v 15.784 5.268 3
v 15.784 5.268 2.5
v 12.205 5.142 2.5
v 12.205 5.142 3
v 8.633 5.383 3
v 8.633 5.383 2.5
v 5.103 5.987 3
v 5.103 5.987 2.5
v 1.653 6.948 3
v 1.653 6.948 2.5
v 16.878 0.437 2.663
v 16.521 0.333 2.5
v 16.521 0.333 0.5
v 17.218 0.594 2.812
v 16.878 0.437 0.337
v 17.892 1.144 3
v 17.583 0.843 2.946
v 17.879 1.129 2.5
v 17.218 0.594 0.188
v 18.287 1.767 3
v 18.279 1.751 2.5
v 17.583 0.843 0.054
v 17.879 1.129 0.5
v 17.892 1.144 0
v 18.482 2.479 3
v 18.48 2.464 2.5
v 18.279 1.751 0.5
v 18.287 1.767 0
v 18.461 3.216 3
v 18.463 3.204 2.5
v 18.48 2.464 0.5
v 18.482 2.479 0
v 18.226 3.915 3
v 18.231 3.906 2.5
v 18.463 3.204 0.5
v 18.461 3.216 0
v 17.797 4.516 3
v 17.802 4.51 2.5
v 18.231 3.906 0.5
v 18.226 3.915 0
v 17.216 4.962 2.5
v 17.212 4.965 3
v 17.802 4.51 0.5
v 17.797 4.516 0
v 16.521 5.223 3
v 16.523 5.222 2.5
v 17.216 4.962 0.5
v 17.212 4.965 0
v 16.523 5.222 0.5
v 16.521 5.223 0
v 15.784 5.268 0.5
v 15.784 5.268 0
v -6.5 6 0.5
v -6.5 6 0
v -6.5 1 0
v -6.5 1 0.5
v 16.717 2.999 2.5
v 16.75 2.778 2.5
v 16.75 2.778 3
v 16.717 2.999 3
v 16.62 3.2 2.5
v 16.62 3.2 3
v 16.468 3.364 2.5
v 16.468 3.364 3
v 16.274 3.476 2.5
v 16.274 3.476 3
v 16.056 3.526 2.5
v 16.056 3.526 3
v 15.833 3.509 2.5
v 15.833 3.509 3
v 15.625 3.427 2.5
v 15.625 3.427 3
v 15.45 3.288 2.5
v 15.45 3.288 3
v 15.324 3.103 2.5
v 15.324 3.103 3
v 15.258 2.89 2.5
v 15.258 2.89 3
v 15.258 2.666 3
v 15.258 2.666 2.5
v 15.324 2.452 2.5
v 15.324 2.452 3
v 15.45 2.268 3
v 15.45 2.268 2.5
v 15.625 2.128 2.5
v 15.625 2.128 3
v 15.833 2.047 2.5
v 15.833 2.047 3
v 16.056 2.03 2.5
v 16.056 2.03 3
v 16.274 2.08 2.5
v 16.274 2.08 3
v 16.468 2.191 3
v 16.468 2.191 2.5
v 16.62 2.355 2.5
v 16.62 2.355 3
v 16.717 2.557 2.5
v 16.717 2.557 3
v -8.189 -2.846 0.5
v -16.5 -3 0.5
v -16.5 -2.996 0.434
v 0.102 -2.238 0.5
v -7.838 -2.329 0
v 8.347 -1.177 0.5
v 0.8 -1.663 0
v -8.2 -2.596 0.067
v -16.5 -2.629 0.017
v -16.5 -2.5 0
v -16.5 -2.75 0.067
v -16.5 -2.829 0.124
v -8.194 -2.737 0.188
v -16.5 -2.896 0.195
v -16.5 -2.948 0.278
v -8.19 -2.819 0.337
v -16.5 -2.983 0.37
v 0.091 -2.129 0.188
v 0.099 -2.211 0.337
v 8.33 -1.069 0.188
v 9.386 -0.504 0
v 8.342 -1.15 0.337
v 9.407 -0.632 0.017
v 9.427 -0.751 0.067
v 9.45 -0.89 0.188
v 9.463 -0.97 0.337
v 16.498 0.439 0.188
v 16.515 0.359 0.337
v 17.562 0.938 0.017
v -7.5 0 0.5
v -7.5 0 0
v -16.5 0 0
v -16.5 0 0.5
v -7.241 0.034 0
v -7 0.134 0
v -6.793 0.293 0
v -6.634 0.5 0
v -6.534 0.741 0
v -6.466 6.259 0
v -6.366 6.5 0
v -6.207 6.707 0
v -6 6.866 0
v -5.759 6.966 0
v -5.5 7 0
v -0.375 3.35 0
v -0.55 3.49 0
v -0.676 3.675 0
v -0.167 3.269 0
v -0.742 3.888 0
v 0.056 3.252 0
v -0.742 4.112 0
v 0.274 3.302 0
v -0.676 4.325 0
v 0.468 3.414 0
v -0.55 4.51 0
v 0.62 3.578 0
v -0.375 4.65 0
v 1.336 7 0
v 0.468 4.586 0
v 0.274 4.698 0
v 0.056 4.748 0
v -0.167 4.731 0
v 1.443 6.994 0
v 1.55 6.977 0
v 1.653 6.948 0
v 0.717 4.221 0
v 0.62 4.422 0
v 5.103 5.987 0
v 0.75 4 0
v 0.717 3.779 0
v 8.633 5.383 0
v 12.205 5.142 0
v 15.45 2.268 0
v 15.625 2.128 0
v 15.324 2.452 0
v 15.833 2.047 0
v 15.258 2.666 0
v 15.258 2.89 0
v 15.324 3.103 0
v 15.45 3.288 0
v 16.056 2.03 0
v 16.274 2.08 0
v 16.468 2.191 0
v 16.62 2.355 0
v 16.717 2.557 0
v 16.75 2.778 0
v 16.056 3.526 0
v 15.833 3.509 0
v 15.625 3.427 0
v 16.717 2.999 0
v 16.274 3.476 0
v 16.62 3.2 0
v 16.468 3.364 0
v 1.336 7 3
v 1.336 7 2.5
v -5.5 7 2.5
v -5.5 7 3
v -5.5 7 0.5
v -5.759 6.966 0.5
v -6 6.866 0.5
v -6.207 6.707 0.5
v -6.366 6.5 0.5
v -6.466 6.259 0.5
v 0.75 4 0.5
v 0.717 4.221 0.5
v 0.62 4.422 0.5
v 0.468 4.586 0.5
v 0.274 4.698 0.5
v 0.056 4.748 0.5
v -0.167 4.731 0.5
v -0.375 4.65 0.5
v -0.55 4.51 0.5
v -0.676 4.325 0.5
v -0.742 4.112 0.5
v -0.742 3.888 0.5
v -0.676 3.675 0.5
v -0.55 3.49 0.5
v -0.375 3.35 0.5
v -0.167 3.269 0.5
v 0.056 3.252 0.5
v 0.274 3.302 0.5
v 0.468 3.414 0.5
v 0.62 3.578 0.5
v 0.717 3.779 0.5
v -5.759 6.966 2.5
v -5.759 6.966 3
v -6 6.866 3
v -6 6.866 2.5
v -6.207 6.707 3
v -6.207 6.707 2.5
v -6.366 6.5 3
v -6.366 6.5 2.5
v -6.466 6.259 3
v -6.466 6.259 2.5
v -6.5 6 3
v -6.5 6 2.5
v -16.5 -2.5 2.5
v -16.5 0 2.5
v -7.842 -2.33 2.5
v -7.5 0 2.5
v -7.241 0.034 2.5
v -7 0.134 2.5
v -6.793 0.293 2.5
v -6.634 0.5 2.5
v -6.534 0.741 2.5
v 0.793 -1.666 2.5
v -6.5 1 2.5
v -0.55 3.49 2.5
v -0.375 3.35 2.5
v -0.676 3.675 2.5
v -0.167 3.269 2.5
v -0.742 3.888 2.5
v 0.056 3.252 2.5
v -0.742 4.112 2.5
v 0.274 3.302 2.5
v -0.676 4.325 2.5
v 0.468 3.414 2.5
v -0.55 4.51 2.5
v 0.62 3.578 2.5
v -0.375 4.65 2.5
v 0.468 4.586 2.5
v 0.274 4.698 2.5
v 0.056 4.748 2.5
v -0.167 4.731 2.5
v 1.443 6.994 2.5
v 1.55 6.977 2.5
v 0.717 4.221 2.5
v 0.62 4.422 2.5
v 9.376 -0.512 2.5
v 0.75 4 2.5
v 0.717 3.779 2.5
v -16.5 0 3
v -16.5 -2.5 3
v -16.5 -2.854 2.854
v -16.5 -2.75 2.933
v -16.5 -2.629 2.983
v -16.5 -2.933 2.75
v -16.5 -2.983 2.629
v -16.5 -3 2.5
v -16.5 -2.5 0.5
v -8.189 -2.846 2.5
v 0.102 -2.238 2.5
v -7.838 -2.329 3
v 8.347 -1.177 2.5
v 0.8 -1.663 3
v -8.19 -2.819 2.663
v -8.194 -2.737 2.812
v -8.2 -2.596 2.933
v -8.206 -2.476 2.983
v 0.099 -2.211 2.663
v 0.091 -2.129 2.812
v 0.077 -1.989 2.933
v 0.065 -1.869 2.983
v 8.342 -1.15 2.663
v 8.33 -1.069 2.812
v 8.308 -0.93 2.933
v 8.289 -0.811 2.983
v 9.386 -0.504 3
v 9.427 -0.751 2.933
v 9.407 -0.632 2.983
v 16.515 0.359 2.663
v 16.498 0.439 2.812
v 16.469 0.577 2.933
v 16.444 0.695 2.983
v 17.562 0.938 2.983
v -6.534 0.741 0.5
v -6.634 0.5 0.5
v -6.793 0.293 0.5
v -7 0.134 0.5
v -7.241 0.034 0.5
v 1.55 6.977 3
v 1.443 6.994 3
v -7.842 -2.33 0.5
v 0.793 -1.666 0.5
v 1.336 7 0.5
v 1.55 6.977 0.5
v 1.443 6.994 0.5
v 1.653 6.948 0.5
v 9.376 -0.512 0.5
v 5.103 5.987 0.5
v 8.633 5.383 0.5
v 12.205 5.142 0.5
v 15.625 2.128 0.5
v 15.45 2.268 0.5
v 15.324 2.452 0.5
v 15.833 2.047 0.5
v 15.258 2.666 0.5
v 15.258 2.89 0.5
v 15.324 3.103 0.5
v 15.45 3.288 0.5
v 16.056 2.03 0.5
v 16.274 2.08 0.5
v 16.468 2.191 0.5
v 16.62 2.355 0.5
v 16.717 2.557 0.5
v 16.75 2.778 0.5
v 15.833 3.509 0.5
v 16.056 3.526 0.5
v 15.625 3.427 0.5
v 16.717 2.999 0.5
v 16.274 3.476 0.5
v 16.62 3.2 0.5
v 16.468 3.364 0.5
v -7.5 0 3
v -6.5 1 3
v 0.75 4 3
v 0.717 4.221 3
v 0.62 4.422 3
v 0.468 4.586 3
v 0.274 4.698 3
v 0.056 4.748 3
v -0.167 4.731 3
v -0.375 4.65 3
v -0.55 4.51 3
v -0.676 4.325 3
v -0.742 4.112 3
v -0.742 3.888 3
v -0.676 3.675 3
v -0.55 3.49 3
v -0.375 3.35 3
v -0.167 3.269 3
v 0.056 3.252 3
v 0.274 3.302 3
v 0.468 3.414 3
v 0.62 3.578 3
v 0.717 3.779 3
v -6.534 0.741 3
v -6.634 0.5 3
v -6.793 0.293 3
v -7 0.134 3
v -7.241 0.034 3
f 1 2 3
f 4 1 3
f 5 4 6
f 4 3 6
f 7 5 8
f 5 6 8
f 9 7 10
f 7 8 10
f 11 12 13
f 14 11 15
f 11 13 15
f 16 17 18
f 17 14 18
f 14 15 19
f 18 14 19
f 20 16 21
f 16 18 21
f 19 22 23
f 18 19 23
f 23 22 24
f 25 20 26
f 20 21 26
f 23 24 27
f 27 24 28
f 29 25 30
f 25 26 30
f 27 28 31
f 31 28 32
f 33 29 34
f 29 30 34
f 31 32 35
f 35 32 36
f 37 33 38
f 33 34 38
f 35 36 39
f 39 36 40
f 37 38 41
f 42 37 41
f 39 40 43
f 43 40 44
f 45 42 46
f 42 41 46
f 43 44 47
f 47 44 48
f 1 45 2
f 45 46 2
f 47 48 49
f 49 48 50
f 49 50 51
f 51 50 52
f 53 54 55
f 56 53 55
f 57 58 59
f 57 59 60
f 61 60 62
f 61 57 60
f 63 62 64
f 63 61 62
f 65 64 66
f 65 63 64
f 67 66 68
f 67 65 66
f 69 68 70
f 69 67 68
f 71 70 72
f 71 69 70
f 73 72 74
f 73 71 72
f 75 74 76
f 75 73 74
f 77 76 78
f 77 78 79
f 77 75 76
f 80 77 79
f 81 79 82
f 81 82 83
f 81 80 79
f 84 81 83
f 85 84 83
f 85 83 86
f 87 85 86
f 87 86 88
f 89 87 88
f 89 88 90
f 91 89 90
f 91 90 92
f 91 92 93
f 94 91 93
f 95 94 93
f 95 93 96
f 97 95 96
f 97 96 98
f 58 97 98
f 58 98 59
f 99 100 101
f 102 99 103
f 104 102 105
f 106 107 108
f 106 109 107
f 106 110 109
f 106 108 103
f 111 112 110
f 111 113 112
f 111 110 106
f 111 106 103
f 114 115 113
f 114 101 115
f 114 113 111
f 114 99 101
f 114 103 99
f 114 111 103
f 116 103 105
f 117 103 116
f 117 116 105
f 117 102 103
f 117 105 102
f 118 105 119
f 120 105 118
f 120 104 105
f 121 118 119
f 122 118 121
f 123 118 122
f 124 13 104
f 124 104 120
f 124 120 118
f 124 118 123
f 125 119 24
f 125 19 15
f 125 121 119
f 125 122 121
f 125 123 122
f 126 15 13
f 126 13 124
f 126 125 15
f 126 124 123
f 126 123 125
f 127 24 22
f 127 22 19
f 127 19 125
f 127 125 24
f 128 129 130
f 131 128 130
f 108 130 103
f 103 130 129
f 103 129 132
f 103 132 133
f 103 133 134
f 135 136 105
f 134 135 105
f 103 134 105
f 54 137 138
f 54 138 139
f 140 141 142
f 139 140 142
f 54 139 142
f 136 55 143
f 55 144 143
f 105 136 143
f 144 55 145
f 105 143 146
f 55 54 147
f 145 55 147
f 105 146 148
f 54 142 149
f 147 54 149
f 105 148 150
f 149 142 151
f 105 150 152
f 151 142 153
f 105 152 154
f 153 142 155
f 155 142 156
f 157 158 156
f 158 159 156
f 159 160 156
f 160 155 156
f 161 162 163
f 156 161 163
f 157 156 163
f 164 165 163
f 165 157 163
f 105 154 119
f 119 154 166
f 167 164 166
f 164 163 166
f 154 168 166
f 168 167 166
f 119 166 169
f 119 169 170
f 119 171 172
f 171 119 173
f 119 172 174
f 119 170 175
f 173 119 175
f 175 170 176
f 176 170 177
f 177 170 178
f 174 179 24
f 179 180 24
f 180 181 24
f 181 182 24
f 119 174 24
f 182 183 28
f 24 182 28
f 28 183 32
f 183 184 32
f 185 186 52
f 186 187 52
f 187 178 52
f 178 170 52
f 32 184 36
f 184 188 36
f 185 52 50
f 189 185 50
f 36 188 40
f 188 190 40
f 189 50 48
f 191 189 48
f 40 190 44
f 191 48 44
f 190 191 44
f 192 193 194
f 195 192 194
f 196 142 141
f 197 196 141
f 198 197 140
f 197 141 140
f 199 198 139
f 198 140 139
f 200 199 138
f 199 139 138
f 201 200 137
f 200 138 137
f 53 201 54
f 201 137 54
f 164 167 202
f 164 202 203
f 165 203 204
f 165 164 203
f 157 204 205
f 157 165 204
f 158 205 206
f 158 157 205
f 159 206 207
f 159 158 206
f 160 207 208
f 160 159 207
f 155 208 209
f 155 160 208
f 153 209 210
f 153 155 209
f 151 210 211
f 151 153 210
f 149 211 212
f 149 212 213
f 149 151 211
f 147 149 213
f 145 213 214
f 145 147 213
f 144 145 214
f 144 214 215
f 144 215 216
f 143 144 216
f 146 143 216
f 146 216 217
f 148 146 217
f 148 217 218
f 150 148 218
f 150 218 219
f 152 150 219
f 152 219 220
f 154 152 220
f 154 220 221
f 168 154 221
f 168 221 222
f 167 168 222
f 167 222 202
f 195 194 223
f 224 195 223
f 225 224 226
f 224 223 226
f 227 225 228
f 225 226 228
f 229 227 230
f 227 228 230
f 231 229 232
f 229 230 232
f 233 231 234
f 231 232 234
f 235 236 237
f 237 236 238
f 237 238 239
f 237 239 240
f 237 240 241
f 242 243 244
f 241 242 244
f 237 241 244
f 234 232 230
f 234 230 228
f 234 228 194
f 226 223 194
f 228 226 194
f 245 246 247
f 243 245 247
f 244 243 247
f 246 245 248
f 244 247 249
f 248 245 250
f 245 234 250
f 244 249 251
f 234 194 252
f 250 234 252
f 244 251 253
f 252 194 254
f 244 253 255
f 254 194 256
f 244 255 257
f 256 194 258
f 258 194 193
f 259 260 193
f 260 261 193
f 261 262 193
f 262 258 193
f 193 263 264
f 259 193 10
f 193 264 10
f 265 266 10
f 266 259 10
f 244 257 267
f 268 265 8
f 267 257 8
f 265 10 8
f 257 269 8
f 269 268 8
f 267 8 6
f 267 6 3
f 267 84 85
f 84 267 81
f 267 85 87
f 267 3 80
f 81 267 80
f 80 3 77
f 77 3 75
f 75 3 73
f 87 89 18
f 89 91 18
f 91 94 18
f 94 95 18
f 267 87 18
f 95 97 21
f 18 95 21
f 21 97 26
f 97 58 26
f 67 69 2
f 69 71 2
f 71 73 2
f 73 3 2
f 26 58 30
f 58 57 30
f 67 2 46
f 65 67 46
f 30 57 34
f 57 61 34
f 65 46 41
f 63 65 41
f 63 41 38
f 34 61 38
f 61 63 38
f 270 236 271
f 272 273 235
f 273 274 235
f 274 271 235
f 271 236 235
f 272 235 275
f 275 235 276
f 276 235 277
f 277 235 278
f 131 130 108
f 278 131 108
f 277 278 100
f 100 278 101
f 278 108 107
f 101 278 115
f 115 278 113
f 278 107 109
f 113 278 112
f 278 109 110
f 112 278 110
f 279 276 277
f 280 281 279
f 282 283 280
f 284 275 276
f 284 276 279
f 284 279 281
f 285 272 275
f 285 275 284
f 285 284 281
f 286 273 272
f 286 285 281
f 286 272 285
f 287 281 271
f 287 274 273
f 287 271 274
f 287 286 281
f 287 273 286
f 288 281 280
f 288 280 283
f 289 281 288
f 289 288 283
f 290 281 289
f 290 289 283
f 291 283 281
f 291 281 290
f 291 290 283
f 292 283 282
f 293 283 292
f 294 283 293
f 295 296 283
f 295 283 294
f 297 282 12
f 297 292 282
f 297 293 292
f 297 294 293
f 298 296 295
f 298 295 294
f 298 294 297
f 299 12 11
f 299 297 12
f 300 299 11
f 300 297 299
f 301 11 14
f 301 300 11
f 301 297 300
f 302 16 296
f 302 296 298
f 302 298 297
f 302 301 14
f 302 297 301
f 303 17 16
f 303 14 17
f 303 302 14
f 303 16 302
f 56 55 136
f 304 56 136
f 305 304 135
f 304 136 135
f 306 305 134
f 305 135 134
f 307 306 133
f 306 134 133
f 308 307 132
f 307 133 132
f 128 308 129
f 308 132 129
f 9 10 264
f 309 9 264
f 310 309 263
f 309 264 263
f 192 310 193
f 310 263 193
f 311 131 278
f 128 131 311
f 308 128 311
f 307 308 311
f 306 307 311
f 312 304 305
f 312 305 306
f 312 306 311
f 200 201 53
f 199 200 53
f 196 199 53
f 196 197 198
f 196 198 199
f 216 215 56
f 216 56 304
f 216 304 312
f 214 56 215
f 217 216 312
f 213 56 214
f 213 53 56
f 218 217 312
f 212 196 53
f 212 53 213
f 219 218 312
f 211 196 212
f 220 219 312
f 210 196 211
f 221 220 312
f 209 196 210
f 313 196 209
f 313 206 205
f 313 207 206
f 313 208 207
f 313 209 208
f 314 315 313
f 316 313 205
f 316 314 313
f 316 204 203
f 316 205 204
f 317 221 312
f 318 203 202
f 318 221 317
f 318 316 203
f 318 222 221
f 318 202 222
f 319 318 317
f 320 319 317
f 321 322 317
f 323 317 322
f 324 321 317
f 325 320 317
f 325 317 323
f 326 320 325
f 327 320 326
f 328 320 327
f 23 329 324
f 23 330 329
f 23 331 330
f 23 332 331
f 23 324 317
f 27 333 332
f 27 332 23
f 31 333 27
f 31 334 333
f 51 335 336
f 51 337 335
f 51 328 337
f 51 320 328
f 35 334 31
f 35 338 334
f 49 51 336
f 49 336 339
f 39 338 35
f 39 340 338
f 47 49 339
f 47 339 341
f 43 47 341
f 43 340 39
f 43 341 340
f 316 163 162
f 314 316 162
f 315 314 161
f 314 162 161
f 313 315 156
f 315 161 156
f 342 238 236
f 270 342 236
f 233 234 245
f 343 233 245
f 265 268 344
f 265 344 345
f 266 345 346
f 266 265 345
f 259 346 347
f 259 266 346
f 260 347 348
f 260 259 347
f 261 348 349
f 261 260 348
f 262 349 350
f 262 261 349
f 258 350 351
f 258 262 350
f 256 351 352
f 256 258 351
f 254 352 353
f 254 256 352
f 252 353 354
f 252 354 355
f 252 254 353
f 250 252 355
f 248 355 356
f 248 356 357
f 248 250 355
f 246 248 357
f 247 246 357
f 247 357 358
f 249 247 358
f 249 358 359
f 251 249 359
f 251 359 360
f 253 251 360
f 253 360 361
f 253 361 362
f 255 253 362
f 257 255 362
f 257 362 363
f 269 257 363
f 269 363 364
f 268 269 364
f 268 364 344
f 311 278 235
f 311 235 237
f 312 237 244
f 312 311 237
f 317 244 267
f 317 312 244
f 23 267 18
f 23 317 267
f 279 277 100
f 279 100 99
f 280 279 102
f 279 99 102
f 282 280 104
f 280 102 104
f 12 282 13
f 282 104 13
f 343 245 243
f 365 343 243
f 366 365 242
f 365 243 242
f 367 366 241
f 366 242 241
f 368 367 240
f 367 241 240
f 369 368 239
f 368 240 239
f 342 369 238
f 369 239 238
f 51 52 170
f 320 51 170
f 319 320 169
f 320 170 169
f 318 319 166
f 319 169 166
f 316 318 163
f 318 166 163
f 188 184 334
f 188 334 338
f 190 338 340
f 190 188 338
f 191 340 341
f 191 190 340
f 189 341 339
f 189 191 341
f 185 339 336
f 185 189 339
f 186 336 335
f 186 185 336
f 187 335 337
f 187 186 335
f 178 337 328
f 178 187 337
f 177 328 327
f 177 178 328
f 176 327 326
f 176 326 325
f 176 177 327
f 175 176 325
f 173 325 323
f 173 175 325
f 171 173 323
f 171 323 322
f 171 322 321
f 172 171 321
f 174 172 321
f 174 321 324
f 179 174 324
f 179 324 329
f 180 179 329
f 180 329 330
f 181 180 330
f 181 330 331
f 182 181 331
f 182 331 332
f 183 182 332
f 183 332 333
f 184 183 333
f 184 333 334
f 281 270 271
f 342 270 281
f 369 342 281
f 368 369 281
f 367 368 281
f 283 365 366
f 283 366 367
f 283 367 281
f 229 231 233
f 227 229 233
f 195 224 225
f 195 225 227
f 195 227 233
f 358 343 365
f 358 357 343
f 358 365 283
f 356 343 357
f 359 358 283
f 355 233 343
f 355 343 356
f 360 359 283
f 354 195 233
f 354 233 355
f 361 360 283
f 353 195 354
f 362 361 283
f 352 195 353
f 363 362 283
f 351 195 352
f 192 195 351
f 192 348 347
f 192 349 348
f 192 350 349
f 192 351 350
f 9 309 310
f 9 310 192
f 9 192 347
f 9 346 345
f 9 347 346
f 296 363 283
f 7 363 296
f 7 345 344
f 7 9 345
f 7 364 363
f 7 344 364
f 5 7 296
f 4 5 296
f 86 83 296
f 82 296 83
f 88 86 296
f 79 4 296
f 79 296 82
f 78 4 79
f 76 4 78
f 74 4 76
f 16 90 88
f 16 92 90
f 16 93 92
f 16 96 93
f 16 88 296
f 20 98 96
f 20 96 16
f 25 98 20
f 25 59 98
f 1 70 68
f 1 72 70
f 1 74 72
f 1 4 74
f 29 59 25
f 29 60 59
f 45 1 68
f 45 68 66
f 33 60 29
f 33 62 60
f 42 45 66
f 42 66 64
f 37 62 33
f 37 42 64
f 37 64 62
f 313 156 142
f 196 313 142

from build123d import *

# Parameters (mm, degrees)
SCHIZZO1_R                   = 0.75
ESTRUSIONE_ESTRUSIONE1_DEPTH = 3
TAGLIO_ESTRUSIONE2_START     = 0.5
TAGLIO_ESTRUSIONE2_OUTLINE_R = 0.75
TAGLIO_ESTRUSIONE2_DEPTH     = 2
RACCORDO1_R                  = 0.5


with BuildPart() as part:
    # Schizzo1 → Estrusione-Estrusione1 (new body)
    with BuildSketch(Plane.XY):
        with BuildLine():
            Line((1.335883711, 7), (-5.5, 7))
            ThreePointArc((-5.5, 7), (-6.207106781, 6.707106781), (-6.5, 6))
            Line((-6.5, 6), (-6.5, 1))
            ThreePointArc((-6.5, 1), (-6.792893219, 0.292893219), (-7.5, 0))
            Line((-7.5, 0), (-16.5, 0))
            Line((-16.5, 0), (-16.5, -3))
            ThreePointArc((-16.5, -3), (0.101782453, -2.23760178), (16.521096634, 0.332719886))
            ThreePointArc((16.521096634, 0.332719886), (18.472600065, 3.146927603), (15.784267214, 5.268482974))
            ThreePointArc((15.784267214, 5.268482974), (8.632526621, 5.382625954), (1.653331613, 6.948275714))
            ThreePointArc((1.653331613, 6.948275714), (1.496700822, 6.986984223), (1.335883711, 7))
        make_face()
        with Locations((0, 4)):
            Circle(SCHIZZO1_R, mode=Mode.SUBTRACT)
        with Locations((16, 2.777808494)):
            Circle(SCHIZZO1_R, mode=Mode.SUBTRACT)
    extrude(amount=ESTRUSIONE_ESTRUSIONE1_DEPTH)

    # Taglio-Estrusione2: read off the stored shape, not the designer's step
    # Taglio-Estrusione2 outline → Taglio-Estrusione2 (cut)
    with BuildSketch(Plane.XY.offset(TAGLIO_ESTRUSIONE2_START)):
        with BuildLine():
            ThreePointArc((-16.5, -2.5), (0.79291183, -1.666252109), (17.878837946, 1.128575953))
            ThreePointArc((17.878837946, 1.128575953), (18.230736925, 3.906441637), (15.784267214, 5.268482974))
            ThreePointArc((15.784267214, 5.268482974), (8.632526621, 5.382625954), (1.653331613, 6.948275714))
            ThreePointArc((1.653331613, 6.948275714), (1.496700822, 6.986984223), (1.335883711, 7))
            Line((1.335883711, 7), (-5.5, 7))
            ThreePointArc((-5.5, 7), (-6.207106781, 6.707106781), (-6.5, 6))
            Line((-6.5, 6), (-6.5, 1))
            ThreePointArc((-6.5, 1), (-6.792893219, 0.292893219), (-7.5, 0))
            Line((-7.5, 0), (-16.5, 0))
            Line((-16.5, 0), (-16.5, -2.5))
        make_face()
        with Locations((0, 4)):
            Circle(TAGLIO_ESTRUSIONE2_OUTLINE_R, mode=Mode.SUBTRACT)
        with Locations((16, 2.777808494)):
            Circle(TAGLIO_ESTRUSIONE2_OUTLINE_R, mode=Mode.SUBTRACT)
    extrude(amount=TAGLIO_ESTRUSIONE2_DEPTH, mode=Mode.SUBTRACT)

    # Raccordo1
    # the kernel refuses this fillet: 0.5 mm, written as the material it takes off along each edge
    with BuildSketch(Plane(origin=(-15.161578714, 148.994107216, 0), x_dir=(-0.017028442214045383, -0.9998550055661886, 0), z_dir=(-0.9998550055661886, 0.017028442214045383, 0))) as raccordo1_piece_1:
        with BuildLine():
            CenterArc((152 - RACCORDO1_R, RACCORDO1_R), RACCORDO1_R, 270, 90)
            Line((152, RACCORDO1_R), (152, 0))
            Line((152, 0), (152 - RACCORDO1_R, 0))
        make_face()
    revolve(axis=Axis((-15.161578714, 148.994107216, 0), (0, 0, 1)), revolution_arc=13.807590381, mode=Mode.SUBTRACT)
    with BuildSketch(Plane(origin=(-15.161578714, 148.994107216, 3), x_dir=(-0.017028442214045383, -0.9998550055661886, 0), z_dir=(-0.9998550055661886, 0.017028442214045383, 0))) as raccordo1_piece_2:
        with BuildLine():
            CenterArc((152 - RACCORDO1_R, -RACCORDO1_R), RACCORDO1_R, 0, 90)
            Line((152 - RACCORDO1_R, 0), (152, 0))
            Line((152, 0), (152, -RACCORDO1_R))
        make_face()
    revolve(axis=Axis((-15.161578714, 148.994107216, 3), (0, 0, 1)), revolution_arc=13.807590381, mode=Mode.SUBTRACT)


solid = part.part
